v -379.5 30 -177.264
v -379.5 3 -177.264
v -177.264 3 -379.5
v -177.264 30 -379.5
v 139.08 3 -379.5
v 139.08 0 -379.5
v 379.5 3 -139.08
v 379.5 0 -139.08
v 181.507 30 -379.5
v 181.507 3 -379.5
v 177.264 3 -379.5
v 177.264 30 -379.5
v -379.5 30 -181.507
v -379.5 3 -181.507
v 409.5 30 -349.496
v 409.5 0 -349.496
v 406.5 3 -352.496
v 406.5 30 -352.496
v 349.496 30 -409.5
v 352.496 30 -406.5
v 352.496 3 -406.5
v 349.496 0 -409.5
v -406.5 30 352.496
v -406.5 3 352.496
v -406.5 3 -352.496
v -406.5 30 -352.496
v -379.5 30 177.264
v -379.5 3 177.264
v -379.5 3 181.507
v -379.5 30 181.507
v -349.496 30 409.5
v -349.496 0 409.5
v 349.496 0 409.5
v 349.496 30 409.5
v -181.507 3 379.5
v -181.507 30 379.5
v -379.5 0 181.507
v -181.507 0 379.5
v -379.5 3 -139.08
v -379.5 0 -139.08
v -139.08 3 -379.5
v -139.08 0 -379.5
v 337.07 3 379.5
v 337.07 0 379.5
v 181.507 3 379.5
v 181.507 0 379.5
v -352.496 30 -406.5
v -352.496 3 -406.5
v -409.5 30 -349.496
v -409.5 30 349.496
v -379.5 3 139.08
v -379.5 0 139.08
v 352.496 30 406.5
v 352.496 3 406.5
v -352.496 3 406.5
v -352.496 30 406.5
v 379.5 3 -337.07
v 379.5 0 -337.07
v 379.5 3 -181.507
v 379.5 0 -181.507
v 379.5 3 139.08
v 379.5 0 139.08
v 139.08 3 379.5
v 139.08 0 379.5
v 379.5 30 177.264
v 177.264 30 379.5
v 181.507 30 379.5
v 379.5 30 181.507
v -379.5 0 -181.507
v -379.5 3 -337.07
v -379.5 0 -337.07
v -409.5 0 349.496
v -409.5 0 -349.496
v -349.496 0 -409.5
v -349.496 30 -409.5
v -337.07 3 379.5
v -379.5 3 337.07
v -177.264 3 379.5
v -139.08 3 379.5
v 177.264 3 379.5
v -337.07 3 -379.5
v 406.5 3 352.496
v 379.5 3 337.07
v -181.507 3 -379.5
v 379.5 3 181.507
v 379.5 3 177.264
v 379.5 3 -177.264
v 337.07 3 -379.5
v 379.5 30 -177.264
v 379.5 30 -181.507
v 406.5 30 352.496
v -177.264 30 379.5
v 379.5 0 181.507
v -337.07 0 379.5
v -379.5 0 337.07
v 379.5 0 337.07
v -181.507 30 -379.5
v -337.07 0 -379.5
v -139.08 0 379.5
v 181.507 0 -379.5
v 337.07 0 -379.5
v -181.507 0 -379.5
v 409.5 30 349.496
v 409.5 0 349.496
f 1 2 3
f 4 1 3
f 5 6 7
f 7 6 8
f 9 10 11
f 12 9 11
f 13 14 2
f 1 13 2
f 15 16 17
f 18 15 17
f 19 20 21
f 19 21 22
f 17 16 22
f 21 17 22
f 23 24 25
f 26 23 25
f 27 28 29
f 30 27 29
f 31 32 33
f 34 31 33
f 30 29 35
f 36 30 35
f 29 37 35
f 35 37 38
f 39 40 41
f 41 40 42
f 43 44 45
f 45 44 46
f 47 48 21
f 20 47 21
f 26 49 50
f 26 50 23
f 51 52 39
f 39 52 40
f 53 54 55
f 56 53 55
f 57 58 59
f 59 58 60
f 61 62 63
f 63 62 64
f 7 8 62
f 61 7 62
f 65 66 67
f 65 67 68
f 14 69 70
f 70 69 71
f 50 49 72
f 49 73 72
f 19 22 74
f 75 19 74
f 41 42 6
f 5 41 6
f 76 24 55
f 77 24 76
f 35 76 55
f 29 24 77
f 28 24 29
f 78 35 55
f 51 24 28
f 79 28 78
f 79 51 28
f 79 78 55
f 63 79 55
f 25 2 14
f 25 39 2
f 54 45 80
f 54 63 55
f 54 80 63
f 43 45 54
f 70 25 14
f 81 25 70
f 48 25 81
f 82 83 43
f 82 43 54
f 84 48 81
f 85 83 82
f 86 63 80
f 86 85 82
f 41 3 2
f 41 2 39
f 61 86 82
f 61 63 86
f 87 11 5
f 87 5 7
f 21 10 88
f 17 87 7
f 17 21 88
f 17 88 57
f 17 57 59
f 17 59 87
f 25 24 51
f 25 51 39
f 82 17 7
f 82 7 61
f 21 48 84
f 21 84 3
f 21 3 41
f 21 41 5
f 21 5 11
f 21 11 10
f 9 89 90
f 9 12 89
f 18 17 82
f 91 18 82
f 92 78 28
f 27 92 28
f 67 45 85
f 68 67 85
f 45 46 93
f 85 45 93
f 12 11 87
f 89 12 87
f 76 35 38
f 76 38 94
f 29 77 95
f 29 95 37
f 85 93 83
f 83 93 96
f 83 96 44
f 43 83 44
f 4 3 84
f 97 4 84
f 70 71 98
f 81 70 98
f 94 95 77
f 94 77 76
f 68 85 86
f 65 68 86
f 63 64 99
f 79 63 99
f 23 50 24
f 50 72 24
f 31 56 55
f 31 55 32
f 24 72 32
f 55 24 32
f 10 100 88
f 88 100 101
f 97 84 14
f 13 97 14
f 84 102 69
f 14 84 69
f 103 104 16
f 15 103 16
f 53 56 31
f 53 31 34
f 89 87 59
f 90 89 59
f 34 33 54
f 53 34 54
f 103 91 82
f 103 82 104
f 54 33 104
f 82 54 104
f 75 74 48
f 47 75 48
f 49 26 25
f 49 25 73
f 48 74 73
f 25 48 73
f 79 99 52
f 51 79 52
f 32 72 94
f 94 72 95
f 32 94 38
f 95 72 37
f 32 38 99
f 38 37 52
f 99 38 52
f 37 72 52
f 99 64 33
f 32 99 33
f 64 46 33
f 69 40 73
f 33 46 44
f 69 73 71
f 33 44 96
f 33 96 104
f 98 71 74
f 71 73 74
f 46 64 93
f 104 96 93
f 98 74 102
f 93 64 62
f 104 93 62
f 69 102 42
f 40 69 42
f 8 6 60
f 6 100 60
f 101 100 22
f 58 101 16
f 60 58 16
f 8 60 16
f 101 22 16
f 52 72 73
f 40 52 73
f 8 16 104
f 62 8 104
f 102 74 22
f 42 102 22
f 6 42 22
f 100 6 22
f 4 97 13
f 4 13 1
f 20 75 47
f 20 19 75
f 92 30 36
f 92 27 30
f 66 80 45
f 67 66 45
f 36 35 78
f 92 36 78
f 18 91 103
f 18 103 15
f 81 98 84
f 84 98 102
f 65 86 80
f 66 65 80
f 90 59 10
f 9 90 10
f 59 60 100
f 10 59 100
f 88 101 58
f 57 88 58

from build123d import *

# Parameters (mm, degrees)
SKETCH1_W            = 819
SKETCH1_H            = 819
SKETCH1_W_2          = 759
SKETCH1_H_2          = 759
BOSS_EXTRUDE1_DEPTH  = 3
SKETCH2_W            = 819
SKETCH2_H            = 819
SKETCH2_W_2          = 813
SKETCH2_H_2          = 813
BOSS_EXTRUDE2_DEPTH  = 27
BOSS_EXTRUDE3_DEPTH  = 3
CUT_EXTRUDE1_DEPTH   = 130
BOSS_EXTRUDE4_DEPTH  = 3
BOSS_EXTRUDE5_DEPTH  = 27
CUT_EXTRUDE2_DEPTH   = 163
MIRROR3_DEPTH        = 30
MIRROR3_2_DEPTH      = 3
MIRROR4_DEPTH        = 30
MIRROR4_2_DEPTH      = 3
CUT_EXTRUDE3_START   = -673
CUT_EXTRUDE3_DEPTH   = 1124
CUT_EXTRUDE4_DEPTH   = 300
BOSS_EXTRUDE8_DEPTH  = 3
BOSS_EXTRUDE9_DEPTH  = 27
BOSS_EXTRUDE10_DEPTH = 3
CUT_EXTRUDE9_DEPTH   = 266
CUT_EXTRUDE10_DEPTH  = 27
CUT_EXTRUDE11_DEPTH  = 27
BOSS_EXTRUDE13_DEPTH = 27
BOSS_EXTRUDE15_DEPTH = 3
BOSS_EXTRUDE16_DEPTH = 27
MIRROR17_DEPTH       = 3
MIRROR17_START       = 3
MIRROR17_2_DEPTH     = 27
MIRROR26_DEPTH       = 3
MIRROR26_START       = 3
MIRROR26_2_DEPTH     = 27


# Read off the part's stored shape, not the designer's step: Mirror3, Mirror4, Mirror17, Mirror26
with BuildPart() as part:
    # Sketch1 → Boss-Extrude1 (new body)
    with BuildSketch(Plane(origin=(0, 0, 0), x_dir=(1, 0, 0), z_dir=(0, 1, 0))):
        Rectangle(SKETCH1_W, SKETCH1_H)
        Rectangle(SKETCH1_W_2, SKETCH1_H_2, mode=Mode.SUBTRACT)
    extrude(amount=BOSS_EXTRUDE1_DEPTH)

    # Sketch2 → Boss-Extrude2 (add)
    with BuildSketch(Plane(origin=(0, 3, 0), x_dir=(1, 0, 0), z_dir=(0, 1, 0))):
        Rectangle(SKETCH2_W, SKETCH2_H)
        Rectangle(SKETCH2_W_2, SKETCH2_H_2, mode=Mode.SUBTRACT)
    extrude(amount=BOSS_EXTRUDE2_DEPTH)

    # Sketch3 → Boss-Extrude3 (add)
    with BuildSketch(Plane.XZ):
        Polygon((-294.643593129, 379.5), (-337.07, 379.5), (-379.5, 337.07), (-379.5, 294.643593129), align=None)
    extrude(amount=-BOSS_EXTRUDE3_DEPTH)

    # Sketch4 → Cut-Extrude1 (cut)
    with BuildSketch(Plane(origin=(0, 0, 0), x_dir=(-1, 0, 0), z_dir=(0, -1, 0))):
        Polygon((358.285, -358.285), (409.5, -307.07), (409.5, -409.5), (307.07, -409.5), align=None)
    extrude(amount=-CUT_EXTRUDE1_DEPTH, mode=Mode.SUBTRACT)

    # Sketch7 → Boss-Extrude4 (add)
    with BuildSketch(Plane(origin=(0, 0, 0), x_dir=(-1, 0, 0), z_dir=(0, -1, 0))):
        Polygon((409.5, -109.080101268), (409.5, -73.724762208), (73.724762208, -409.5), (109.080101268, -409.5), align=None)
    extrude(amount=-BOSS_EXTRUDE4_DEPTH)

    # Sketch8 → Boss-Extrude5 (add)
    with BuildSketch(Plane(origin=(0, 3, 0), x_dir=(1, 0, 0), z_dir=(0, 1, 0))):
        Polygon((-406.5, -76.724762208), (-406.5, -80.967402896), (-80.967402896, -406.5), (-76.724762208, -406.5), align=None)
    extrude(amount=BOSS_EXTRUDE5_DEPTH)

    # Sketch10 → Cut-Extrude2 (cut)
    with BuildSketch(Plane(origin=(0, 0, 0), x_dir=(-1, 0, 0), z_dir=(0, -1, 0))):
        Polygon((0, -409.5), (0, 0), (409.5, 0), (409.5, 409.5), (-409.5, 409.5), (-409.5, -409.5), align=None)
    extrude(amount=-CUT_EXTRUDE2_DEPTH, mode=Mode.SUBTRACT)

    # Mirror3 outline → Mirror3 (add)
    with BuildSketch(Plane(origin=(0, 0, 0), x_dir=(1, 0, 0), z_dir=(0, 1, 0))):
        Polygon((406.5, -76.724762208), (76.724762208, -406.5), (0, -406.5), (0, -409.5), (307.07, -409.5), (310.07, -406.5), (80.967402896, -406.5), (406.5, -80.967402896), (406.5, -310.07), (409.5, -307.07), (409.5, 0), (406.5, 0), align=None)
    extrude(amount=MIRROR3_DEPTH)

    # Mirror3 2 outline → Mirror3 2 (add)
    # profile 1 of 3: a face of its own
    with BuildSketch(Plane(origin=(0, 0, 0), x_dir=(1, 0, 0), z_dir=(0, 1, 0))):
        Polygon((0, -406.5), (76.724762208, -406.5), (103.724762208, -379.5), (0, -379.5), align=None)
    # profile 2 of 3: a face of its own
    with BuildSketch(Plane(origin=(0, 0, 0), x_dir=(1, 0, 0), z_dir=(0, 1, 0))):
        Polygon((379.5, 0), (379.5, -103.724762208), (406.5, -76.724762208), (406.5, 0), align=None)
    # profile 3 of 3: a face of its own
    with BuildSketch(Plane(origin=(0, 0, 0), x_dir=(1, 0, 0), z_dir=(0, 1, 0))):
        Polygon((80.967402896, -406.5), (310.07, -406.5), (406.5, -310.07), (406.5, -80.967402896), align=None)
        Polygon((379.5, -294.643593129), (294.643593129, -379.5), (139.080101268, -379.5), (379.5, -139.080101268), align=None, mode=Mode.SUBTRACT)
    extrude(amount=MIRROR3_2_DEPTH)

    # Mirror4 outline → Mirror4 (add)
    with BuildSketch(Plane(origin=(0, 0, 0), x_dir=(1, 0, 0), z_dir=(0, 1, 0))):
        Polygon((-409.5, 0), (-406.5, 0), (-406.5, 76.724762208), (-76.724762208, 406.5), (76.724762208, 406.5), (406.5, 76.724762208), (406.5, 0), (409.5, 0), (409.5, 307.07), (406.5, 310.07), (406.5, 80.967402896), (80.967402896, 406.5), (310.07, 406.5), (307.07, 409.5), (-307.07, 409.5), (-310.07, 406.5), (-80.967402896, 406.5), (-406.5, 80.967402896), (-406.5, 310.07), (-409.5, 307.07), align=None)
    extrude(amount=MIRROR4_DEPTH)

    # Mirror4 2 outline → Mirror4 2 (add)
    # profile 1 of 5: a face of its own
    with BuildSketch(Plane(origin=(0, 0, 0), x_dir=(1, 0, 0), z_dir=(0, 1, 0))):
        Polygon((-406.5, 76.724762208), (-406.5, 0), (-379.5, 0), (-379.5, 103.724762208), align=None)
    # profile 2 of 5: a face of its own
    with BuildSketch(Plane(origin=(0, 0, 0), x_dir=(1, 0, 0), z_dir=(0, 1, 0))):
        Polygon((-76.724762208, 406.5), (-103.724762208, 379.5), (103.724762208, 379.5), (76.724762208, 406.5), align=None)
    # profile 3 of 5: a face of its own
    with BuildSketch(Plane(origin=(0, 0, 0), x_dir=(1, 0, 0), z_dir=(0, 1, 0))):
        Polygon((-310.07, 406.5), (-406.5, 310.07), (-406.5, 80.967402896), (-80.967402896, 406.5), align=None)
        Polygon((-139.080101268, 379.5), (-379.5, 139.080101268), (-379.5, 294.643593129), (-294.643593129, 379.5), align=None, mode=Mode.SUBTRACT)
    # profile 4 of 5: a face of its own
    with BuildSketch(Plane(origin=(0, 0, 0), x_dir=(1, 0, 0), z_dir=(0, 1, 0))):
        Polygon((406.5, 76.724762208), (379.5, 103.724762208), (379.5, 0), (406.5, 0), align=None)
    # profile 5 of 5: a face of its own
    with BuildSketch(Plane(origin=(0, 0, 0), x_dir=(1, 0, 0), z_dir=(0, 1, 0))):
        Polygon((406.5, 310.07), (310.07, 406.5), (80.967402896, 406.5), (406.5, 80.967402896), align=None)
        Polygon((294.643593129, 379.5), (379.5, 294.643593129), (379.5, 139.080101268), (139.080101268, 379.5), align=None, mode=Mode.SUBTRACT)
    extrude(amount=MIRROR4_2_DEPTH)

    # Sketch12 → Cut-Extrude3 (cut)
    with BuildSketch(Plane(origin=(0, 0, 0), x_dir=(-1, 0, 0), z_dir=(0, -1, 0)).offset(CUT_EXTRUDE3_START)):
        Polygon((379.5, -337.07), (379.5, -294.643593129), (294.643593129, -379.5), (337.07, -379.5), align=None)
    extrude(amount=CUT_EXTRUDE3_DEPTH, mode=Mode.SUBTRACT)

    # Sketch13 → Cut-Extrude4 (cut)
    with BuildSketch(Plane.XZ):
        Polygon((-409.5, 0), (0, 0), (0, 409.5), (505.643397908, 433.197413997), (586.960318624, -390.321219438), (40.755373804, -460.11749056), (-470.159650687, -449.460798141), align=None)
    extrude(amount=-CUT_EXTRUDE4_DEPTH, mode=Mode.SUBTRACT)

    # Sketch14 → Boss-Extrude8 (add)
    with BuildSketch(Plane.XZ):
        Polygon((-409.5, 307.07), (-307.07, 409.5), (-335.354271247, 409.5), (-409.5, 335.354271247), align=None)
    extrude(amount=-BOSS_EXTRUDE8_DEPTH)

    # Sketch16 → Boss-Extrude9 (add)
    with BuildSketch(Plane(origin=(0, 3, 0), x_dir=(1, 0, 0), z_dir=(0, 1, 0))):
        Polygon((-409.5, -307.07), (-406.5, -310.07), (-406.5, -338.354271247), (-409.5, -335.354271247), align=None)
        Polygon((-307.07, -409.5), (-310.07, -406.5), (-338.354271247, -406.5), (-335.354271247, -409.5), align=None)
    extrude(amount=BOSS_EXTRUDE9_DEPTH)

    # Sketch17 → Boss-Extrude10 (add)
    with BuildSketch(Plane(origin=(0, 0, 0), x_dir=(-1, 0, 0), z_dir=(0, -1, 0))):
        Polygon((181.506508139, -379.5), (379.5, -181.506508139), (379.5, -139.080101268), (139.080101268, -379.5), align=None)
    extrude(amount=-BOSS_EXTRUDE10_DEPTH)

    # Sketch18 → Cut-Extrude9 (cut)
    with BuildSketch(Plane(origin=(0, 0, 0), x_dir=(-1, 0, 0), z_dir=(0, -1, 0))):
        Polygon((379.5, -103.724762208), (103.724762208, -379.5), (139.080101268, -379.5), (379.5, -139.080101268), align=None)
    extrude(amount=-CUT_EXTRUDE9_DEPTH, mode=Mode.SUBTRACT)

    # Sketch19 → Cut-Extrude10 (cut)
    with BuildSketch(Plane(origin=(0, 30, 0), x_dir=(1, 0, 0), z_dir=(0, 1, 0))):
        Polygon((-406.5, -80.967402896), (-406.5, -76.724762208), (-379.5, -103.724762208), (-379.5, -107.967402896), align=None)
    extrude(amount=-CUT_EXTRUDE10_DEPTH, mode=Mode.SUBTRACT)

    # Sketch20 → Cut-Extrude11 (cut)
    with BuildSketch(Plane(origin=(0, 30, 0), x_dir=(1, 0, 0), z_dir=(0, 1, 0))):
        Polygon((-107.967402896, -379.5), (-103.724762208, -379.5), (-76.724762208, -406.5), (-80.967402896, -406.5), align=None)
    extrude(amount=-CUT_EXTRUDE11_DEPTH, mode=Mode.SUBTRACT)

    # Sketch21 → Boss-Extrude13 (add)
    with BuildSketch(Plane(origin=(0, 3, 0), x_dir=(1, 0, 0), z_dir=(0, 1, 0))):
        Polygon((-379.5, -181.506508139), (-181.506508139, -379.5), (-177.263867452, -379.5), (-379.5, -177.263867452), align=None)
    extrude(amount=BOSS_EXTRUDE13_DEPTH)

    # Sketch22 → Boss-Extrude15 (add)
    with BuildSketch(Plane(origin=(0, 0, 0), x_dir=(-1, 0, 0), z_dir=(0, -1, 0))):
        Polygon((409.5, -335.354271247), (335.354271247, -409.5), (349.496406871, -409.5), (409.5, -349.496406871), align=None)
    extrude(amount=-BOSS_EXTRUDE15_DEPTH)

    # Sketch23 → Boss-Extrude16 (add)
    with BuildSketch(Plane(origin=(0, 3, 0), x_dir=(1, 0, 0), z_dir=(0, 1, 0))):
        Polygon((-406.5, -338.354271247), (-409.5, -335.354271247), (-409.5, -349.496406871), (-406.5, -352.496406871), align=None)
        Polygon((-338.354271247, -406.5), (-352.496406871, -406.5), (-349.496406871, -409.5), (-335.354271247, -409.5), align=None)
    extrude(amount=BOSS_EXTRUDE16_DEPTH)

    # Mirror17 outline → Mirror17 (add)
    with BuildSketch(Plane(origin=(0, 0, 0), x_dir=(1, 0, 0), z_dir=(0, 1, 0))):
        Polygon((379.5, -139.080101268), (139.080101268, -379.5), (0, -379.5), (0, -409.5), (349.496406871, -409.5), (409.5, -349.496406871), (409.5, 0), (379.5, 0), align=None)
        Polygon((379.5, -337.07), (337.07, -379.5), (181.506508139, -379.5), (379.5, -181.506508139), align=None, mode=Mode.SUBTRACT)
    extrude(amount=MIRROR17_DEPTH)

    # Mirror17 2 outline → Mirror17 2 (add)
    with BuildSketch(Plane(origin=(0, 0, 0), x_dir=(1, 0, 0), z_dir=(0, 1, 0)).offset(MIRROR17_START)):
        Polygon((352.496406871, -406.5), (0, -406.5), (0, -409.5), (349.496406871, -409.5), align=None)
        Polygon((409.5, 0), (406.5, 0), (406.5, -352.496406871), (409.5, -349.496406871), align=None)
        Polygon((177.263867452, -379.5), (181.506508139, -379.5), (379.5, -181.506508139), (379.5, -177.263867452), align=None)
    extrude(amount=MIRROR17_2_DEPTH)

    # Mirror26 outline → Mirror26 (add)
    with BuildSketch(Plane(origin=(0, 0, 0), x_dir=(1, 0, 0), z_dir=(0, 1, 0))):
        Polygon((-379.5, 0), (-379.5, 139.080101268), (-139.080101268, 379.5), (139.080101268, 379.5), (379.5, 139.080101268), (379.5, 0), (409.5, 0), (409.5, 349.496406871), (349.496406871, 409.5), (-349.496406871, 409.5), (-409.5, 349.496406871), (-409.5, 0), align=None)
        Polygon((-337.07, 379.5), (-181.506508139, 379.5), (-379.5, 181.506508139), (-379.5, 337.07), align=None, mode=Mode.SUBTRACT)
        Polygon((337.07, 379.5), (379.5, 337.07), (379.5, 181.506508139), (181.506508139, 379.5), align=None, mode=Mode.SUBTRACT)
    extrude(amount=MIRROR26_DEPTH)

    # Mirror26 2 outline → Mirror26 2 (add)
    with BuildSketch(Plane(origin=(0, 0, 0), x_dir=(1, 0, 0), z_dir=(0, 1, 0)).offset(MIRROR26_START)):
        Polygon((-409.5, 0), (-406.5, 0), (-406.5, 352.496406871), (-409.5, 349.496406871), align=None)
        Polygon((-349.496406871, 409.5), (-352.496406871, 406.5), (352.496406871, 406.5), (349.496406871, 409.5), align=None)
        Polygon((409.5, 349.496406871), (406.5, 352.496406871), (406.5, 0), (409.5, 0), align=None)
        Polygon((-181.506508139, 379.5), (-379.5, 181.506508139), (-379.5, 177.263867452), (-177.263867452, 379.5), align=None)
        Polygon((379.5, 177.263867452), (379.5, 181.506508139), (181.506508139, 379.5), (177.263867452, 379.5), align=None)
    extrude(amount=MIRROR26_2_DEPTH)


solid = part.part
